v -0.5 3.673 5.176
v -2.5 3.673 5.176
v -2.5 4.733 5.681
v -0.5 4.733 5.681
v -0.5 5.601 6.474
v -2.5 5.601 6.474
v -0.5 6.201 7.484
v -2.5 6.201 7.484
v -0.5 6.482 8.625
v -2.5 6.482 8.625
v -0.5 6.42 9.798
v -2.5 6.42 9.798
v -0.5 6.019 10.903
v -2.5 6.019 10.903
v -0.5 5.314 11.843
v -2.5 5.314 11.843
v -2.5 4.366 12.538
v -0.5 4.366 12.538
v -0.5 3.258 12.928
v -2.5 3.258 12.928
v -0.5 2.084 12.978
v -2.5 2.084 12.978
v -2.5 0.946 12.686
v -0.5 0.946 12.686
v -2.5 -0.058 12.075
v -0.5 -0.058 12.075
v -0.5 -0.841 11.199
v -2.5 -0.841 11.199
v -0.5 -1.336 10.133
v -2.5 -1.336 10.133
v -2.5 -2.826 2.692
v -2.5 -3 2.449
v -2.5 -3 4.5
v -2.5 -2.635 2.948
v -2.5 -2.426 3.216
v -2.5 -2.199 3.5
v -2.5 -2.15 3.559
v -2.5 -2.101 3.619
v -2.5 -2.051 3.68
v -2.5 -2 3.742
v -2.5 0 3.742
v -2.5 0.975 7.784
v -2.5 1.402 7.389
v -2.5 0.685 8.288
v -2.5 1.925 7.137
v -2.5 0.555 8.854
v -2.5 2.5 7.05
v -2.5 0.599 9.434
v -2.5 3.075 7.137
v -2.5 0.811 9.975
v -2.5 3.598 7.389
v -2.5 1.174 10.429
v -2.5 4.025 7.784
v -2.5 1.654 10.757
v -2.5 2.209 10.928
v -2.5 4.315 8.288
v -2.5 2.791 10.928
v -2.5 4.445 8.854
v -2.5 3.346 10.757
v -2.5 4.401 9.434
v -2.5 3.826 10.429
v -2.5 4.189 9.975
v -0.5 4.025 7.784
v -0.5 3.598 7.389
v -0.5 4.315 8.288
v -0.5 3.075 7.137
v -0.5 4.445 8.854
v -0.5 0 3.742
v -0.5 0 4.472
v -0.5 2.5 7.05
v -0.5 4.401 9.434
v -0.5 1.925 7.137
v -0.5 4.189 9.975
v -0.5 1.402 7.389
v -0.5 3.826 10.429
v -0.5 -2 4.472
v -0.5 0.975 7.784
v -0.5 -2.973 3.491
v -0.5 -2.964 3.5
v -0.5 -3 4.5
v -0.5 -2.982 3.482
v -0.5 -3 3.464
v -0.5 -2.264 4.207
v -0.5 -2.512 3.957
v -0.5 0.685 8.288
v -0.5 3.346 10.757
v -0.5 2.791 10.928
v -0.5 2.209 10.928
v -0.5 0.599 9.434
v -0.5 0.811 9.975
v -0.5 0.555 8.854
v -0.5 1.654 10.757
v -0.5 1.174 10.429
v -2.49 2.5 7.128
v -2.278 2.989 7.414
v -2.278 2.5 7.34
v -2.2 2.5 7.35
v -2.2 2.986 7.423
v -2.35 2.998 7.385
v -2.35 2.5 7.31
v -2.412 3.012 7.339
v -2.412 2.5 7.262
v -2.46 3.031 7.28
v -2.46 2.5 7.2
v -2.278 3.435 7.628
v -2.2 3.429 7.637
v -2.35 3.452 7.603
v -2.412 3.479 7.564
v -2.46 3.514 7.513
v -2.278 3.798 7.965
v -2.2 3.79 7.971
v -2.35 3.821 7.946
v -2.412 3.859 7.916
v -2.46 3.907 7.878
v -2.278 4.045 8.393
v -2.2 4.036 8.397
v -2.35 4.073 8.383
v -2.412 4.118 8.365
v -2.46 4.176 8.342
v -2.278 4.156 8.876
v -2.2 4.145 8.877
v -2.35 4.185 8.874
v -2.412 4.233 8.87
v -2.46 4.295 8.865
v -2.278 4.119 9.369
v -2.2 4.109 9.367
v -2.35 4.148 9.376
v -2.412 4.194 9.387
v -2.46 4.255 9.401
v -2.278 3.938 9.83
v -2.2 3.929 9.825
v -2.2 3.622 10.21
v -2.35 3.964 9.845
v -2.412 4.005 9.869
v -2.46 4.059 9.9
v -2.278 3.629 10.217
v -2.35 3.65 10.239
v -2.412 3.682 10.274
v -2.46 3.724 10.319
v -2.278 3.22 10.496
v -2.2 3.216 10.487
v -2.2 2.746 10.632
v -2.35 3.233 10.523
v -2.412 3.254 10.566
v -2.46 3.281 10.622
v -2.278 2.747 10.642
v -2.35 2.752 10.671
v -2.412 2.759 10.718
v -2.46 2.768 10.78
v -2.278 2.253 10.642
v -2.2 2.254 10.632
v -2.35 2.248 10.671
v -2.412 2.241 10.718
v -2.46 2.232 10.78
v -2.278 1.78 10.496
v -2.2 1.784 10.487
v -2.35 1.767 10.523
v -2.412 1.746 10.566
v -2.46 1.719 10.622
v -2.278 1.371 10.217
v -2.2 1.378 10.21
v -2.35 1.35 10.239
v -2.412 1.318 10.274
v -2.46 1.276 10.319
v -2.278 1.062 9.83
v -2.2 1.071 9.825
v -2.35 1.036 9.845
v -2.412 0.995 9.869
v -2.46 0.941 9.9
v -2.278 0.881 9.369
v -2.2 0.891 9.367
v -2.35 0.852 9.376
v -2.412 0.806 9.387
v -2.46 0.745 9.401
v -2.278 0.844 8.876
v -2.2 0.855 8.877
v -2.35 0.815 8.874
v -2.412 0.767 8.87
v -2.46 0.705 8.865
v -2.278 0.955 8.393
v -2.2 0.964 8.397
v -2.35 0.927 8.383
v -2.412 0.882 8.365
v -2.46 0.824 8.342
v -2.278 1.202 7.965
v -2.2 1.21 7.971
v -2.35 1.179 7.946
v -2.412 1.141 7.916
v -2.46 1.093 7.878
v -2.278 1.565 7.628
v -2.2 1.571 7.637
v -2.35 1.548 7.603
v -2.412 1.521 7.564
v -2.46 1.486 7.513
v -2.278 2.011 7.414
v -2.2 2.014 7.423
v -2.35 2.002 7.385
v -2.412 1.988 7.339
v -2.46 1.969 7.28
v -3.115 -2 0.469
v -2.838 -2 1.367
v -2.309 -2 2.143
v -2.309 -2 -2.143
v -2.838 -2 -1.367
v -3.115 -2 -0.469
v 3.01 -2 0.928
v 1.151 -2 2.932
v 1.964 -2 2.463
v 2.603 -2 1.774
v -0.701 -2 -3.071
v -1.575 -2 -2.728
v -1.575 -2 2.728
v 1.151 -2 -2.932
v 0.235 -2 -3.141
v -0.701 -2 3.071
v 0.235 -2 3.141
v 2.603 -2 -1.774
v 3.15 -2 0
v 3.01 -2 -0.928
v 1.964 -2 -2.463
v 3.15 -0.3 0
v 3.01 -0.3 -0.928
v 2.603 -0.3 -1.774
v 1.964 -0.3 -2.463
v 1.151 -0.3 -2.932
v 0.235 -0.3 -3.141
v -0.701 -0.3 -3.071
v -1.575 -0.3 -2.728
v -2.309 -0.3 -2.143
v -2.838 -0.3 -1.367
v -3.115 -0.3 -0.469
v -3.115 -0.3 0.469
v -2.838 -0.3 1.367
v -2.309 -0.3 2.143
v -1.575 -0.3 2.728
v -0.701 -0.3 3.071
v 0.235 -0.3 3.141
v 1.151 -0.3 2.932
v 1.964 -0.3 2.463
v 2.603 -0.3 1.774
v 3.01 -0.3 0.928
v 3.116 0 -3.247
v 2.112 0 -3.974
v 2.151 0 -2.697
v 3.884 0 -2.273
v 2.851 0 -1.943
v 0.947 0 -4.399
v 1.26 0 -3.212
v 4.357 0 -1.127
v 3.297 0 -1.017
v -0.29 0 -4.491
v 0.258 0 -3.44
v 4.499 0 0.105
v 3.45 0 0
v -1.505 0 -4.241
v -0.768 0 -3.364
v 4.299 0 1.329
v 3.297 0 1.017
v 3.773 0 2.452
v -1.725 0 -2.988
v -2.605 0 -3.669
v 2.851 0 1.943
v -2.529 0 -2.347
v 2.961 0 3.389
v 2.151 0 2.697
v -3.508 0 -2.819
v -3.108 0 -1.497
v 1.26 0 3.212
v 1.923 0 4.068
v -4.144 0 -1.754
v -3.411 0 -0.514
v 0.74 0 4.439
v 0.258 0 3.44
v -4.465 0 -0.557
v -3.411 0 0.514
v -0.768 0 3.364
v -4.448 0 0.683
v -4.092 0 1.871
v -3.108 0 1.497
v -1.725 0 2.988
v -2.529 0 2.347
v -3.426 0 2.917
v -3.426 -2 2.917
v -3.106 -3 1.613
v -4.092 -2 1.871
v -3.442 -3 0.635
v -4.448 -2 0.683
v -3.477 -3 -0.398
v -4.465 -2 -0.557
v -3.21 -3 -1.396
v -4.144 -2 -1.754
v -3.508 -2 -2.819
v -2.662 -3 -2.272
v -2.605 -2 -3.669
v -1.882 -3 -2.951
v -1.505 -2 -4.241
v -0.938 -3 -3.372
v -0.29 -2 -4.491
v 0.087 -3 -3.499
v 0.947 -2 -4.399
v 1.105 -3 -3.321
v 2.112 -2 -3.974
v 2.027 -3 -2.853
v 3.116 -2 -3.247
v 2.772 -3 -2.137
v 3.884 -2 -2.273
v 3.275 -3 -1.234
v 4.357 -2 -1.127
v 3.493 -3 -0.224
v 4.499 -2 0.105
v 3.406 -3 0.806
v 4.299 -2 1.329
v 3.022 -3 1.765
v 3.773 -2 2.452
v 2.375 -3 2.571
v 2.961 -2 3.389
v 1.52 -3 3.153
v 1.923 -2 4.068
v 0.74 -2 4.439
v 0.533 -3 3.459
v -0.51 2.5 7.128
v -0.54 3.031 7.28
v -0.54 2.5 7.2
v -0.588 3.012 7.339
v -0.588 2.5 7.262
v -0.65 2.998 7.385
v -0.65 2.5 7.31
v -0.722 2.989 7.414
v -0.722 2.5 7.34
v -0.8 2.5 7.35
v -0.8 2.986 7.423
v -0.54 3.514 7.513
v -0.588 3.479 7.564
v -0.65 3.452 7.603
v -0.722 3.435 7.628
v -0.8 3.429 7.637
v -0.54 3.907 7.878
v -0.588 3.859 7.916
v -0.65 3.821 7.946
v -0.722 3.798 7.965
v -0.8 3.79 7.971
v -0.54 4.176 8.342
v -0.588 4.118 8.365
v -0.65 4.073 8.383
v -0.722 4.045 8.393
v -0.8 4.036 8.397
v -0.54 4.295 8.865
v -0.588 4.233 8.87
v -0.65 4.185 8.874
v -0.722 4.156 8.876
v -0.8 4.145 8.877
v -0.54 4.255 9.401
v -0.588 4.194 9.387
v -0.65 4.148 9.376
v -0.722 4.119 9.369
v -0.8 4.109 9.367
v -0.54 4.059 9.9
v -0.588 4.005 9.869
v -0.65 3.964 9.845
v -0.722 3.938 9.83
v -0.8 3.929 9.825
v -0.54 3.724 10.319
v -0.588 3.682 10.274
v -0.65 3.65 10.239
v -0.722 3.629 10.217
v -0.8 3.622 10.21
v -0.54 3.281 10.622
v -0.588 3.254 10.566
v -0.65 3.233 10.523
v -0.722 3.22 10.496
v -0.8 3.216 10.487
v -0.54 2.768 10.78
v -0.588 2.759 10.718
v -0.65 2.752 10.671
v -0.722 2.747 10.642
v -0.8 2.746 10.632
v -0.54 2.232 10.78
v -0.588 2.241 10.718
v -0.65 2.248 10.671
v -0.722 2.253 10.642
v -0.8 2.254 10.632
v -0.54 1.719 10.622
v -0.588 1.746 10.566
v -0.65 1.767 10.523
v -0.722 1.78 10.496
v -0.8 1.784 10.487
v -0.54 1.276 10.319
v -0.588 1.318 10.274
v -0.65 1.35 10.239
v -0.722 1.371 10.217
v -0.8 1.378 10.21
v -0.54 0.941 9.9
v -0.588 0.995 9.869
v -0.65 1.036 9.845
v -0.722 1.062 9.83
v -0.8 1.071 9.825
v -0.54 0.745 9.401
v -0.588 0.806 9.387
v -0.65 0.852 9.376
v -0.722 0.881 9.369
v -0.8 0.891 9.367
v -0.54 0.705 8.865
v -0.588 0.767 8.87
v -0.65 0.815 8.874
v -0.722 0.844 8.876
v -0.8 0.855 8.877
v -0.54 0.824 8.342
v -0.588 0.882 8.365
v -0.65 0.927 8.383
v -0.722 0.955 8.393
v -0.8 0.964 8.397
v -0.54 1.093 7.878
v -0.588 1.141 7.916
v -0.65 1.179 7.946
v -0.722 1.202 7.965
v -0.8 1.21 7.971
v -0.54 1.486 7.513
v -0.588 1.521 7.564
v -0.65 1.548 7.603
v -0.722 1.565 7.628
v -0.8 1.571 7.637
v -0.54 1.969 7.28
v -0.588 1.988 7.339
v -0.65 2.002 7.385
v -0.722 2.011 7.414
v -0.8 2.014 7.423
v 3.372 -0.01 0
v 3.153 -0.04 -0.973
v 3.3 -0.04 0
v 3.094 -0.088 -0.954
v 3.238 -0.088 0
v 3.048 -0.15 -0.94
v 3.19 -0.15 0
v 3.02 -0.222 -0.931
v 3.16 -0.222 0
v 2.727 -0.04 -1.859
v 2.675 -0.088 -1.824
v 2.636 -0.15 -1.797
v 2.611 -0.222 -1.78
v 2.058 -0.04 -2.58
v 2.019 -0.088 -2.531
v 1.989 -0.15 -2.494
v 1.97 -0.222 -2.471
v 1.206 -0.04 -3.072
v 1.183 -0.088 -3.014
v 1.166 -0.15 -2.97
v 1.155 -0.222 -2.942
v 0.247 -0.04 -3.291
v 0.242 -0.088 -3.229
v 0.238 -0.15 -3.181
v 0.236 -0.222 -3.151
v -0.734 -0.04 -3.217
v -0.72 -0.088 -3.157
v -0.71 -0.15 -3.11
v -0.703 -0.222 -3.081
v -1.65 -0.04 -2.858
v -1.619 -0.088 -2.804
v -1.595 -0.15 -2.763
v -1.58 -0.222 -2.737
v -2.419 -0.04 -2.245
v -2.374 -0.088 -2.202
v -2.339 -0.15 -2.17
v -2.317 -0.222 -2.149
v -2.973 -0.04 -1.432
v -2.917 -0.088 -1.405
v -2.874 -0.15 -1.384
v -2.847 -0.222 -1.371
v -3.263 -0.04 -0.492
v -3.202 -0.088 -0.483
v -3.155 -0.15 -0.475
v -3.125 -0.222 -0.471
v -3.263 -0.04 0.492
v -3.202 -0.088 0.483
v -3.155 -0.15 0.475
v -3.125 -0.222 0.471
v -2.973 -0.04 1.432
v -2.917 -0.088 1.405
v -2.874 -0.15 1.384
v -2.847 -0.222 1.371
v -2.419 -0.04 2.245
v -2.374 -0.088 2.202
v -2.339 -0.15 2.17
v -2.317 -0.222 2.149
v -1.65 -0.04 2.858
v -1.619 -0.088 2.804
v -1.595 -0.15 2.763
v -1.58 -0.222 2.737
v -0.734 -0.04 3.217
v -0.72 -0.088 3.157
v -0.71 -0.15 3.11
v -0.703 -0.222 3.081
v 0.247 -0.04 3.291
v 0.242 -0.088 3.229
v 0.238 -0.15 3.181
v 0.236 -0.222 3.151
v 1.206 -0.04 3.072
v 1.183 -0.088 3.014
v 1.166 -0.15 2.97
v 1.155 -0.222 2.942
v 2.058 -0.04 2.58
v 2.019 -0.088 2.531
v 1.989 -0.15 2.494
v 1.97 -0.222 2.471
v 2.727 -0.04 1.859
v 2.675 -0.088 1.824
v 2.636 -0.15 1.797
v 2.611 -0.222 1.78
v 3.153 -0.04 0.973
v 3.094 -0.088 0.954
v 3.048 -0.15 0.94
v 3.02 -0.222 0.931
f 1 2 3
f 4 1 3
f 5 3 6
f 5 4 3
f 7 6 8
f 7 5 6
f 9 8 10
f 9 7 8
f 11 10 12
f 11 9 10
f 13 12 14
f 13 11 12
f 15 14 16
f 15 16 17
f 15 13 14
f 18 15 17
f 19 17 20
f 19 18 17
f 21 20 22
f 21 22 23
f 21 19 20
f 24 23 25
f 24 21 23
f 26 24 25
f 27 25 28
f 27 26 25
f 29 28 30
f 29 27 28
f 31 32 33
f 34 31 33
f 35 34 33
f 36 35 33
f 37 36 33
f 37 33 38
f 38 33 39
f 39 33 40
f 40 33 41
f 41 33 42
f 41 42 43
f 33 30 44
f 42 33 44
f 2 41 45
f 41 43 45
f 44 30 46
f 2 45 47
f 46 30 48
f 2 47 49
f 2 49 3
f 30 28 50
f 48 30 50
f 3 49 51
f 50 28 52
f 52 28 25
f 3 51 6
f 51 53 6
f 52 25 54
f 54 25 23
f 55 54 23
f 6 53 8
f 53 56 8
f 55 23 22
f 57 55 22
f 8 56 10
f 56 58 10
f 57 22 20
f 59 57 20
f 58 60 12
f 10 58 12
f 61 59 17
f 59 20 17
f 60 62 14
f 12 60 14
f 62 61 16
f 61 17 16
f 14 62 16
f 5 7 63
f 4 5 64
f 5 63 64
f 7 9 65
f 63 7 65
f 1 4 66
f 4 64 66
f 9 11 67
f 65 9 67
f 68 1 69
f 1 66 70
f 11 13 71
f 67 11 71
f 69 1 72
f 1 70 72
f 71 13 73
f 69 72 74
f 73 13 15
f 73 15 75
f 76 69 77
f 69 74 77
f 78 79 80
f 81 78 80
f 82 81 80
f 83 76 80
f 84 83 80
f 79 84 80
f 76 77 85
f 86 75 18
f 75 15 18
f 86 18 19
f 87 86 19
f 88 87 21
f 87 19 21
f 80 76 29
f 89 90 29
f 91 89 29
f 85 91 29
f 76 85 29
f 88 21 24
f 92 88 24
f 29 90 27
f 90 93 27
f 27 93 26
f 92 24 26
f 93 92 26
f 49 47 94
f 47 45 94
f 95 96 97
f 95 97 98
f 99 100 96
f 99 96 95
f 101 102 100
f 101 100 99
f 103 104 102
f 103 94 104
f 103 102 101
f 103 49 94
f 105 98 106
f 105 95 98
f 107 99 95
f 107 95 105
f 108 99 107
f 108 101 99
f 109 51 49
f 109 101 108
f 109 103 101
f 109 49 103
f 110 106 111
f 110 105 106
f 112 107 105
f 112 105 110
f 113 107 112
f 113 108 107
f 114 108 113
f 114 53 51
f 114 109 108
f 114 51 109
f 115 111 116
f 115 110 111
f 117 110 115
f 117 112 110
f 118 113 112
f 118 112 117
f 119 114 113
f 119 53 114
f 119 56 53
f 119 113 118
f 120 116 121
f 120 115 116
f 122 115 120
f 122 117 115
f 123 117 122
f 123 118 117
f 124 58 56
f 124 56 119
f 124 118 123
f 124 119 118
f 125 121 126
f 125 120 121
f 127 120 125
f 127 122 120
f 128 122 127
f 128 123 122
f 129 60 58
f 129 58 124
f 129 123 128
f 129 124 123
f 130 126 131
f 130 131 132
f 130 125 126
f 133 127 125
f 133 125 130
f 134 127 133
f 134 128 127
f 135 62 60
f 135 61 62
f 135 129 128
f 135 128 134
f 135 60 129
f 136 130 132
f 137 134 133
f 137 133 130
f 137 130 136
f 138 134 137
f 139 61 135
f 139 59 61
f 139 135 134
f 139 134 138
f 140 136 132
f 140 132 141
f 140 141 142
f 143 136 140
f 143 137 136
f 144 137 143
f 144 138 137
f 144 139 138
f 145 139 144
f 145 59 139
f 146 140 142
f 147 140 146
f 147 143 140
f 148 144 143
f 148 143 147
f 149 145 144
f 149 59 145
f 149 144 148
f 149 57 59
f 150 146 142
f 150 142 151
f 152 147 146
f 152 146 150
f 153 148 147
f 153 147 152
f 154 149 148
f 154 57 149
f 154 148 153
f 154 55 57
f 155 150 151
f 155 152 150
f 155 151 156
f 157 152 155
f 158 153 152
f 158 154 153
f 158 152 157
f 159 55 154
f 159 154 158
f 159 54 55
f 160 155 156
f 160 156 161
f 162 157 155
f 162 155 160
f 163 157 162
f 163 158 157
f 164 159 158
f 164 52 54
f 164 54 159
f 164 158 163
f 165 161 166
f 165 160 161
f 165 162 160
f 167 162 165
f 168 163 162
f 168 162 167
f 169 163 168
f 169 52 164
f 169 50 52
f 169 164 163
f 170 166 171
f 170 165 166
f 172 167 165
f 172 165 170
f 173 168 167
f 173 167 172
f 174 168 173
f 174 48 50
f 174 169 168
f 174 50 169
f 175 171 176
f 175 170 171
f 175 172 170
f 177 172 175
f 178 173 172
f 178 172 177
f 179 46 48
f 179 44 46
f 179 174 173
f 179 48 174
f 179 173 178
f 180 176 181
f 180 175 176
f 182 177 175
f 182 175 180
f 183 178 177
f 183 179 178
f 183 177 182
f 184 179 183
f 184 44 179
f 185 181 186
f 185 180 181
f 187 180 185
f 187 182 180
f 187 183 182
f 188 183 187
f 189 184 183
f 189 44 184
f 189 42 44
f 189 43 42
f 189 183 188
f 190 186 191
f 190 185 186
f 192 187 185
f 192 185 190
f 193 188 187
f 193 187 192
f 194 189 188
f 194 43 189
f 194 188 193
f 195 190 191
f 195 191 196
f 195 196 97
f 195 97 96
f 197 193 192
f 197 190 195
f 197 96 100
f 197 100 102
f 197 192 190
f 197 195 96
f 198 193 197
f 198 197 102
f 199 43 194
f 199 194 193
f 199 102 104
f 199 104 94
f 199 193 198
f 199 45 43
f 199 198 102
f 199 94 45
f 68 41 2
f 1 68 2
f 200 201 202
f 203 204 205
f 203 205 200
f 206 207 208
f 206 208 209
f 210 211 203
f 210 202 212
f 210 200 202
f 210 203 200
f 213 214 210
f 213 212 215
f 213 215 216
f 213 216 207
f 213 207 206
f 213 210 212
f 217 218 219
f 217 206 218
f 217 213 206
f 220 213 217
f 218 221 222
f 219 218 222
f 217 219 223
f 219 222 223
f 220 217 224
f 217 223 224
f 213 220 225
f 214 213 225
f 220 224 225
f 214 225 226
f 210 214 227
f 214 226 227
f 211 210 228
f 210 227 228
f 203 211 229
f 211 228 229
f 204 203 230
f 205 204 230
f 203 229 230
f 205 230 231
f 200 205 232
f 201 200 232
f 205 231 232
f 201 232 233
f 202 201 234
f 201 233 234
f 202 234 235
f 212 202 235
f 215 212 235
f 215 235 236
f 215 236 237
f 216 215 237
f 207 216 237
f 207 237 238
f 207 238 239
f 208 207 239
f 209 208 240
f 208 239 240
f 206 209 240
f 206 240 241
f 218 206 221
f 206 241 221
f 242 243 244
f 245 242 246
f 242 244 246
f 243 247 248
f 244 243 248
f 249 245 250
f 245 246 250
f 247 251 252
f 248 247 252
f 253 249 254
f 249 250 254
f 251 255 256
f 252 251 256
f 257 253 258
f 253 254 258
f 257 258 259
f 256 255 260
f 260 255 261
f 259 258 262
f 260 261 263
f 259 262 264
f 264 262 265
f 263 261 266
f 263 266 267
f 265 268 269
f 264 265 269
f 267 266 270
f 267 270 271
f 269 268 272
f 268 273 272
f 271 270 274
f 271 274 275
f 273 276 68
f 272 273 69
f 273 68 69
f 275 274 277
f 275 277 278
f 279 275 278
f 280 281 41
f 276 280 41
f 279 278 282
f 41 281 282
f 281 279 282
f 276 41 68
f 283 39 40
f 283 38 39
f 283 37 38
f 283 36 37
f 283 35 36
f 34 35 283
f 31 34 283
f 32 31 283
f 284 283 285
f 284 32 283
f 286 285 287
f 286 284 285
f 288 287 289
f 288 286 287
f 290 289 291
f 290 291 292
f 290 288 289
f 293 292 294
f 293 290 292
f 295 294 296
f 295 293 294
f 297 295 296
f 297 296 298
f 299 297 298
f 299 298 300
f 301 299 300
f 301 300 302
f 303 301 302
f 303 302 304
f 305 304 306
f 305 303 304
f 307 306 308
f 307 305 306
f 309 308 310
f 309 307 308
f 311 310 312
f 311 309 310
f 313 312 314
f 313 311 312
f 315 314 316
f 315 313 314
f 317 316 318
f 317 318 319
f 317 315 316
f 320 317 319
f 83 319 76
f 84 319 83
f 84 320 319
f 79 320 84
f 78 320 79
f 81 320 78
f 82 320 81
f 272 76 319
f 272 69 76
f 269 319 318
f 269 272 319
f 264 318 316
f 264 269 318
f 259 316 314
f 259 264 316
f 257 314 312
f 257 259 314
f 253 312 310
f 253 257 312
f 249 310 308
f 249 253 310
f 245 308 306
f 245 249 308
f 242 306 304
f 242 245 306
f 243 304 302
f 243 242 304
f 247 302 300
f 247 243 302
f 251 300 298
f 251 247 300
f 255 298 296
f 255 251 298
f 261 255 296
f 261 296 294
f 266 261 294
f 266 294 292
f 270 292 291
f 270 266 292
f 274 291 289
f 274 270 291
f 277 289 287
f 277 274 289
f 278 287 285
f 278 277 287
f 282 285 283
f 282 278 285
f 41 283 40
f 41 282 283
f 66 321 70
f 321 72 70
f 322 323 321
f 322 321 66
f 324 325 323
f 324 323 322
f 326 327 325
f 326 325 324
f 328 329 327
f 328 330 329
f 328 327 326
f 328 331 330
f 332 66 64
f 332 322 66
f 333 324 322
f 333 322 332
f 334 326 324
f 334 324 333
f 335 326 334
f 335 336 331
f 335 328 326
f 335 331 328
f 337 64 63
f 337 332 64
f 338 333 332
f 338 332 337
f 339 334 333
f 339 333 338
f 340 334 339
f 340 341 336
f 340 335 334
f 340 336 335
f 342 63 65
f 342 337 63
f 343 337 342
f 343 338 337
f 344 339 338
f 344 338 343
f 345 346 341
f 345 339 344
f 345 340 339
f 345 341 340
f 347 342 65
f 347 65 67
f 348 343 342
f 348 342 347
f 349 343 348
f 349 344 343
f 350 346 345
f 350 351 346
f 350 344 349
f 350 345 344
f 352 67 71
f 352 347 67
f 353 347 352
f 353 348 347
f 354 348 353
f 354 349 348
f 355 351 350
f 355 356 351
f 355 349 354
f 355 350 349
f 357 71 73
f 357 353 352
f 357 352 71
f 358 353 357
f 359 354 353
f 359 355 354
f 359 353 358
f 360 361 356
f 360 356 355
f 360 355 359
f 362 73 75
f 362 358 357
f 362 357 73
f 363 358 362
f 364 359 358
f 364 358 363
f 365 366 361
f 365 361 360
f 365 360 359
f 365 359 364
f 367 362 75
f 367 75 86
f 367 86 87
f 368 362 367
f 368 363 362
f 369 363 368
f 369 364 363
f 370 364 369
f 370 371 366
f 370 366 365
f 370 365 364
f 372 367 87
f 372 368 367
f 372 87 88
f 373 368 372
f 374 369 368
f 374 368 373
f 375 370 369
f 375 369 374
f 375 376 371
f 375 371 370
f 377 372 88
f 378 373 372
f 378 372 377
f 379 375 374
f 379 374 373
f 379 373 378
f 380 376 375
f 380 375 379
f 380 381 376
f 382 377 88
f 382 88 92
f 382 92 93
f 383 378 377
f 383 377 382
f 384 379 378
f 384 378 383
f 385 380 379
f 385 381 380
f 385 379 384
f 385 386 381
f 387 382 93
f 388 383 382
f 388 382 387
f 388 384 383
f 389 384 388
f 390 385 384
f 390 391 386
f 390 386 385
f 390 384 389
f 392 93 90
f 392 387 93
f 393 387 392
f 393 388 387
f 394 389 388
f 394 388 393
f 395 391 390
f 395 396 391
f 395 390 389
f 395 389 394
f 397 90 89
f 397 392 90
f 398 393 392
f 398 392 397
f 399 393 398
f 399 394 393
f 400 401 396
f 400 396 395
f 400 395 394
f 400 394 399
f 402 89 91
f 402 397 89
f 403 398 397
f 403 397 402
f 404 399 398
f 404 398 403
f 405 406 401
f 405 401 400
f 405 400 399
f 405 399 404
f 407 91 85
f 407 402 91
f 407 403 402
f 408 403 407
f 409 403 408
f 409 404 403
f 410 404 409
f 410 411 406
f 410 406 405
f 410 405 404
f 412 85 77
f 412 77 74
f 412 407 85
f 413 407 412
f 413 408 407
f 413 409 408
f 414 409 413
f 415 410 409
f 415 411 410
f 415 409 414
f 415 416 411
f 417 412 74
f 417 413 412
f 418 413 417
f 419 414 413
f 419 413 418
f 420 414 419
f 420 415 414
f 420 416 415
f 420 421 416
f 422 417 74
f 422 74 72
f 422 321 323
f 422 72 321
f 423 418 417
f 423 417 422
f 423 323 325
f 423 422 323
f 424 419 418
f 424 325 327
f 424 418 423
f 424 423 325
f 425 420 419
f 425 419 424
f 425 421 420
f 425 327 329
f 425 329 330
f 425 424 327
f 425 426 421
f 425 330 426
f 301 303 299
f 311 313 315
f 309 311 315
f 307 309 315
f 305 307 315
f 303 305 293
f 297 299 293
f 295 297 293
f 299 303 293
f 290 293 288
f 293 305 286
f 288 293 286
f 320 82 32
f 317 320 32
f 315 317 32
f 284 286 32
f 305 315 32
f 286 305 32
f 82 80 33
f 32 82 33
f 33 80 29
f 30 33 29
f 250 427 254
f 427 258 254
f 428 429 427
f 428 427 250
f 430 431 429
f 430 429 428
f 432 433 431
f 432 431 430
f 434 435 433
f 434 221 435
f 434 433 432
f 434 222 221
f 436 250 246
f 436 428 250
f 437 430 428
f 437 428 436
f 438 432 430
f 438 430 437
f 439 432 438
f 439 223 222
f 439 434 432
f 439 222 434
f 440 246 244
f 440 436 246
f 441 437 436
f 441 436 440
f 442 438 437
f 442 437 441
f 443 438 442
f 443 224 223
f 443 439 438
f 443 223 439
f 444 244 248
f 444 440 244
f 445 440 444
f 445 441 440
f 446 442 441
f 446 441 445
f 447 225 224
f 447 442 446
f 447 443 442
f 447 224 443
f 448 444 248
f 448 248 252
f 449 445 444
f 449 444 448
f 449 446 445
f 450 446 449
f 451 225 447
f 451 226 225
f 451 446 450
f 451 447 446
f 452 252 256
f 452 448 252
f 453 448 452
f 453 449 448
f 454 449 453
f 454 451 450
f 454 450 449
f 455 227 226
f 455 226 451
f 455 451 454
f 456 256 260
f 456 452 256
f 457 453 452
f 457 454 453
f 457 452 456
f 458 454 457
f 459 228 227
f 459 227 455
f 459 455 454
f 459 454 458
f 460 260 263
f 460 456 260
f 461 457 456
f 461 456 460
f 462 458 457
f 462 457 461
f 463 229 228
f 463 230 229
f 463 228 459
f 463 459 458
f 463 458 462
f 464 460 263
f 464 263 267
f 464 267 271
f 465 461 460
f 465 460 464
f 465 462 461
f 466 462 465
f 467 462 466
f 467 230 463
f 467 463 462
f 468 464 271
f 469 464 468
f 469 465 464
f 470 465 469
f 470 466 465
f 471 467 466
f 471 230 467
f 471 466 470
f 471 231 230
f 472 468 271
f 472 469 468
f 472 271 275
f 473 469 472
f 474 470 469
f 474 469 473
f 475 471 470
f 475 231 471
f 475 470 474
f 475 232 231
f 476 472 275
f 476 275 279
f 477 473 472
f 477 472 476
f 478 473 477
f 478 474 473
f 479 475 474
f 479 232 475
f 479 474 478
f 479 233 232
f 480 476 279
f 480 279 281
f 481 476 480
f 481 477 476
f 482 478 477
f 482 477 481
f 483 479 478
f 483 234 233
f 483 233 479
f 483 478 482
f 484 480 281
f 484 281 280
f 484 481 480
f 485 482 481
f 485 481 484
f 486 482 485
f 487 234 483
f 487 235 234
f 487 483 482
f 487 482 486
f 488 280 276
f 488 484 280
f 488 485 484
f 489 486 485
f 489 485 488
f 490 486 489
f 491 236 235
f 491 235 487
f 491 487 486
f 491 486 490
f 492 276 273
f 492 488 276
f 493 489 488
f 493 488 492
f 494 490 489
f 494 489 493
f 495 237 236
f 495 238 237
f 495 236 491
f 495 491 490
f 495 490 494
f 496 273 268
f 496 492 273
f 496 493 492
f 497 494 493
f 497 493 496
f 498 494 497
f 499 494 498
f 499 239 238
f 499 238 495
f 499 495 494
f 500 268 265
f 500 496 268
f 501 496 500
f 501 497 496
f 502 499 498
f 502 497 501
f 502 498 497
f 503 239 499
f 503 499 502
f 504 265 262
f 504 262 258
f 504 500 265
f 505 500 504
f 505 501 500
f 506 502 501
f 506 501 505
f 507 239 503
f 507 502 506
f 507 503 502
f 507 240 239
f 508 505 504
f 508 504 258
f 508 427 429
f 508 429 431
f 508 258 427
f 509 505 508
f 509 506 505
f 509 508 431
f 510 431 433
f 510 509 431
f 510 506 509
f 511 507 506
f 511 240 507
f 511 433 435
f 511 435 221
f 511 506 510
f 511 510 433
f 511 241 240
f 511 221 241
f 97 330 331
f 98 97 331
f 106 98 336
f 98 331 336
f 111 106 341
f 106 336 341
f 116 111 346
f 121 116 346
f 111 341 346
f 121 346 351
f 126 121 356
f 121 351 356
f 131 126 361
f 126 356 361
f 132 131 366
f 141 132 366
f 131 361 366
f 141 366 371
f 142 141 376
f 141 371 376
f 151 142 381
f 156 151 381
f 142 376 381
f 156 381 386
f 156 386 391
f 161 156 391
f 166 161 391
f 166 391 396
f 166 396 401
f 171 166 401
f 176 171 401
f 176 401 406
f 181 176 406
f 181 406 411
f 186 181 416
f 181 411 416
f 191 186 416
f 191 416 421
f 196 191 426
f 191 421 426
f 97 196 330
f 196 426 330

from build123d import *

# Parameters (mm, degrees)
SKETCH_6_R          = 4.5
EXTRUDE_4_DEPTH     = 3
SKETCH_7_R          = 3.15
CUT_EXTRUDE_4_DEPTH = 2
SKETCH_8_R          = 4
EXTRUDE_5_DEPTH     = 2
EXTRUDE_7_DEPTH     = 2
EXTRUDE_8_REACH     = 10
SKETCH_11_R         = 1.65
CUT_EXTRUDE_6_DEPTH = 2
CUT_EXTRUDE_7_REACH = 9
FILLET_1_R          = 0.3
FILLET_2_R          = 0.3
FILLET_3_R          = 0.3


with BuildPart() as part:
    # 草图6 → 凸台-拉伸4 (new body)
    with BuildSketch(Plane(origin=(0, 0, 0), x_dir=(1, 0, 0), z_dir=(0, 1, 0))):
        Circle(SKETCH_6_R)
    extrude(amount=-EXTRUDE_4_DEPTH)

    # 草图7 → 切除-拉伸4 (cut)
    with BuildSketch(Plane(origin=(0, 0, 0), x_dir=(1, 0, 0), z_dir=(0, 1, 0))):
        Circle(SKETCH_7_R)
    extrude(amount=-CUT_EXTRUDE_4_DEPTH, mode=Mode.SUBTRACT)

    # 草图15 → 切除-旋转2 (revolve, cut)
    with BuildSketch(Plane(origin=(0, 0, 0), x_dir=(0, 0, -1), z_dir=(1, 0, 0))):
        Polygon((4.5, -3), (4.5, -2), (3.5, -3), align=None)
    revolve(axis=Axis((0, 0, 0), (0, -1, 0)), mode=Mode.SUBTRACT)



with BuildPart() as body_2:
    # 草图8 → 凸台-拉伸5 (new body)
    with BuildSketch(Plane(origin=(-0.5, 0, 0), x_dir=(0, 0, -1), z_dir=(1, 0, 0))):
        with Locations((-9, 2.5)):
            Circle(SKETCH_8_R)
    extrude(amount=-EXTRUDE_5_DEPTH)


with BuildPart() as part_1:
    add(part.part)

    add(body_2.part)  # 凸台-拉伸7 merges body 2
    # 草图9 → 凸台-拉伸7 (add)
    with BuildSketch(Plane(origin=(-0.5, 0, 0), x_dir=(0, 0, -1), z_dir=(1, 0, 0))):
        Polygon((-4.5, -3), (-10.133083988, -1.336159626), (-5.152908316, 3.69564436), (-3.5, 0), (-3.5, -3), (-3.52896076, -3), align=None)
    extrude(amount=-EXTRUDE_7_DEPTH)

    # 草图16 → 凸台-拉伸8 (add, up to next)
    with BuildSketch(Plane(origin=(0, 0, 3.5), x_dir=(-1, 0, 0), z_dir=(0, 0, -1)), mode=Mode.PRIVATE) as extrude_8_sk1:
        Polygon((2.5, -3), (2.5, -2.198837366), (0.5, -2.955716811), (0.5, -3), align=None)
    extrude_8_tool1 = extrude(extrude_8_sk1.sketch, amount=EXTRUDE_8_REACH, mode=Mode.PRIVATE) - part_1.part
    add(extrude_8_tool1.solids().sort_by_distance((-1.798414, -2.732173, 3.5))[0])

    # 草图11 → 切除-拉伸6 (cut)
    with BuildSketch(Plane(origin=(-0.5, 0, 0), x_dir=(0, 0, -1), z_dir=(1, 0, 0))):
        with Locations((-9, 2.5)):
            Circle(SKETCH_11_R)
    extrude(amount=-CUT_EXTRUDE_6_DEPTH, mode=Mode.SUBTRACT)

    # 草图12 → 切除-拉伸7 (cut, up to next)
    with BuildSketch(Plane.ZY.offset(2.5), mode=Mode.PRIVATE) as cut_extrude_7_sk1:
        Polygon((3.5, 0), (3.741657387, 0), (5.175729917, 3.672586172), (5.152908316, 3.69564436), align=None)
    cut_extrude_7_tool1 = extrude(cut_extrude_7_sk1.sketch, amount=-CUT_EXTRUDE_7_REACH, mode=Mode.PRIVATE) & part_1.part
    add(cut_extrude_7_tool1.solids().sort_by_distance((-2.5, 1.373556, 4.196165))[0], mode=Mode.SUBTRACT)

    # 圆角1
    fillet_1_edges = [part_1.edges().sort_by_distance(p)[0] for p in [
        (-3.15, 0, 0),
    ]]
    fillet(fillet_1_edges, radius=FILLET_1_R)

    # 圆角2
    fillet_2_edges = [part_1.edges().sort_by_distance(p)[0] for p in [
        (-0.5, 2.5, 10.65),
    ]]
    fillet(fillet_2_edges, radius=FILLET_2_R)

    # 圆角3
    fillet_3_edges = [part_1.edges().sort_by_distance(p)[0] for p in [
        (-2.5, 2.5, 10.65),
    ]]
    fillet(fillet_3_edges, radius=FILLET_3_R)


solid = part_1.part
